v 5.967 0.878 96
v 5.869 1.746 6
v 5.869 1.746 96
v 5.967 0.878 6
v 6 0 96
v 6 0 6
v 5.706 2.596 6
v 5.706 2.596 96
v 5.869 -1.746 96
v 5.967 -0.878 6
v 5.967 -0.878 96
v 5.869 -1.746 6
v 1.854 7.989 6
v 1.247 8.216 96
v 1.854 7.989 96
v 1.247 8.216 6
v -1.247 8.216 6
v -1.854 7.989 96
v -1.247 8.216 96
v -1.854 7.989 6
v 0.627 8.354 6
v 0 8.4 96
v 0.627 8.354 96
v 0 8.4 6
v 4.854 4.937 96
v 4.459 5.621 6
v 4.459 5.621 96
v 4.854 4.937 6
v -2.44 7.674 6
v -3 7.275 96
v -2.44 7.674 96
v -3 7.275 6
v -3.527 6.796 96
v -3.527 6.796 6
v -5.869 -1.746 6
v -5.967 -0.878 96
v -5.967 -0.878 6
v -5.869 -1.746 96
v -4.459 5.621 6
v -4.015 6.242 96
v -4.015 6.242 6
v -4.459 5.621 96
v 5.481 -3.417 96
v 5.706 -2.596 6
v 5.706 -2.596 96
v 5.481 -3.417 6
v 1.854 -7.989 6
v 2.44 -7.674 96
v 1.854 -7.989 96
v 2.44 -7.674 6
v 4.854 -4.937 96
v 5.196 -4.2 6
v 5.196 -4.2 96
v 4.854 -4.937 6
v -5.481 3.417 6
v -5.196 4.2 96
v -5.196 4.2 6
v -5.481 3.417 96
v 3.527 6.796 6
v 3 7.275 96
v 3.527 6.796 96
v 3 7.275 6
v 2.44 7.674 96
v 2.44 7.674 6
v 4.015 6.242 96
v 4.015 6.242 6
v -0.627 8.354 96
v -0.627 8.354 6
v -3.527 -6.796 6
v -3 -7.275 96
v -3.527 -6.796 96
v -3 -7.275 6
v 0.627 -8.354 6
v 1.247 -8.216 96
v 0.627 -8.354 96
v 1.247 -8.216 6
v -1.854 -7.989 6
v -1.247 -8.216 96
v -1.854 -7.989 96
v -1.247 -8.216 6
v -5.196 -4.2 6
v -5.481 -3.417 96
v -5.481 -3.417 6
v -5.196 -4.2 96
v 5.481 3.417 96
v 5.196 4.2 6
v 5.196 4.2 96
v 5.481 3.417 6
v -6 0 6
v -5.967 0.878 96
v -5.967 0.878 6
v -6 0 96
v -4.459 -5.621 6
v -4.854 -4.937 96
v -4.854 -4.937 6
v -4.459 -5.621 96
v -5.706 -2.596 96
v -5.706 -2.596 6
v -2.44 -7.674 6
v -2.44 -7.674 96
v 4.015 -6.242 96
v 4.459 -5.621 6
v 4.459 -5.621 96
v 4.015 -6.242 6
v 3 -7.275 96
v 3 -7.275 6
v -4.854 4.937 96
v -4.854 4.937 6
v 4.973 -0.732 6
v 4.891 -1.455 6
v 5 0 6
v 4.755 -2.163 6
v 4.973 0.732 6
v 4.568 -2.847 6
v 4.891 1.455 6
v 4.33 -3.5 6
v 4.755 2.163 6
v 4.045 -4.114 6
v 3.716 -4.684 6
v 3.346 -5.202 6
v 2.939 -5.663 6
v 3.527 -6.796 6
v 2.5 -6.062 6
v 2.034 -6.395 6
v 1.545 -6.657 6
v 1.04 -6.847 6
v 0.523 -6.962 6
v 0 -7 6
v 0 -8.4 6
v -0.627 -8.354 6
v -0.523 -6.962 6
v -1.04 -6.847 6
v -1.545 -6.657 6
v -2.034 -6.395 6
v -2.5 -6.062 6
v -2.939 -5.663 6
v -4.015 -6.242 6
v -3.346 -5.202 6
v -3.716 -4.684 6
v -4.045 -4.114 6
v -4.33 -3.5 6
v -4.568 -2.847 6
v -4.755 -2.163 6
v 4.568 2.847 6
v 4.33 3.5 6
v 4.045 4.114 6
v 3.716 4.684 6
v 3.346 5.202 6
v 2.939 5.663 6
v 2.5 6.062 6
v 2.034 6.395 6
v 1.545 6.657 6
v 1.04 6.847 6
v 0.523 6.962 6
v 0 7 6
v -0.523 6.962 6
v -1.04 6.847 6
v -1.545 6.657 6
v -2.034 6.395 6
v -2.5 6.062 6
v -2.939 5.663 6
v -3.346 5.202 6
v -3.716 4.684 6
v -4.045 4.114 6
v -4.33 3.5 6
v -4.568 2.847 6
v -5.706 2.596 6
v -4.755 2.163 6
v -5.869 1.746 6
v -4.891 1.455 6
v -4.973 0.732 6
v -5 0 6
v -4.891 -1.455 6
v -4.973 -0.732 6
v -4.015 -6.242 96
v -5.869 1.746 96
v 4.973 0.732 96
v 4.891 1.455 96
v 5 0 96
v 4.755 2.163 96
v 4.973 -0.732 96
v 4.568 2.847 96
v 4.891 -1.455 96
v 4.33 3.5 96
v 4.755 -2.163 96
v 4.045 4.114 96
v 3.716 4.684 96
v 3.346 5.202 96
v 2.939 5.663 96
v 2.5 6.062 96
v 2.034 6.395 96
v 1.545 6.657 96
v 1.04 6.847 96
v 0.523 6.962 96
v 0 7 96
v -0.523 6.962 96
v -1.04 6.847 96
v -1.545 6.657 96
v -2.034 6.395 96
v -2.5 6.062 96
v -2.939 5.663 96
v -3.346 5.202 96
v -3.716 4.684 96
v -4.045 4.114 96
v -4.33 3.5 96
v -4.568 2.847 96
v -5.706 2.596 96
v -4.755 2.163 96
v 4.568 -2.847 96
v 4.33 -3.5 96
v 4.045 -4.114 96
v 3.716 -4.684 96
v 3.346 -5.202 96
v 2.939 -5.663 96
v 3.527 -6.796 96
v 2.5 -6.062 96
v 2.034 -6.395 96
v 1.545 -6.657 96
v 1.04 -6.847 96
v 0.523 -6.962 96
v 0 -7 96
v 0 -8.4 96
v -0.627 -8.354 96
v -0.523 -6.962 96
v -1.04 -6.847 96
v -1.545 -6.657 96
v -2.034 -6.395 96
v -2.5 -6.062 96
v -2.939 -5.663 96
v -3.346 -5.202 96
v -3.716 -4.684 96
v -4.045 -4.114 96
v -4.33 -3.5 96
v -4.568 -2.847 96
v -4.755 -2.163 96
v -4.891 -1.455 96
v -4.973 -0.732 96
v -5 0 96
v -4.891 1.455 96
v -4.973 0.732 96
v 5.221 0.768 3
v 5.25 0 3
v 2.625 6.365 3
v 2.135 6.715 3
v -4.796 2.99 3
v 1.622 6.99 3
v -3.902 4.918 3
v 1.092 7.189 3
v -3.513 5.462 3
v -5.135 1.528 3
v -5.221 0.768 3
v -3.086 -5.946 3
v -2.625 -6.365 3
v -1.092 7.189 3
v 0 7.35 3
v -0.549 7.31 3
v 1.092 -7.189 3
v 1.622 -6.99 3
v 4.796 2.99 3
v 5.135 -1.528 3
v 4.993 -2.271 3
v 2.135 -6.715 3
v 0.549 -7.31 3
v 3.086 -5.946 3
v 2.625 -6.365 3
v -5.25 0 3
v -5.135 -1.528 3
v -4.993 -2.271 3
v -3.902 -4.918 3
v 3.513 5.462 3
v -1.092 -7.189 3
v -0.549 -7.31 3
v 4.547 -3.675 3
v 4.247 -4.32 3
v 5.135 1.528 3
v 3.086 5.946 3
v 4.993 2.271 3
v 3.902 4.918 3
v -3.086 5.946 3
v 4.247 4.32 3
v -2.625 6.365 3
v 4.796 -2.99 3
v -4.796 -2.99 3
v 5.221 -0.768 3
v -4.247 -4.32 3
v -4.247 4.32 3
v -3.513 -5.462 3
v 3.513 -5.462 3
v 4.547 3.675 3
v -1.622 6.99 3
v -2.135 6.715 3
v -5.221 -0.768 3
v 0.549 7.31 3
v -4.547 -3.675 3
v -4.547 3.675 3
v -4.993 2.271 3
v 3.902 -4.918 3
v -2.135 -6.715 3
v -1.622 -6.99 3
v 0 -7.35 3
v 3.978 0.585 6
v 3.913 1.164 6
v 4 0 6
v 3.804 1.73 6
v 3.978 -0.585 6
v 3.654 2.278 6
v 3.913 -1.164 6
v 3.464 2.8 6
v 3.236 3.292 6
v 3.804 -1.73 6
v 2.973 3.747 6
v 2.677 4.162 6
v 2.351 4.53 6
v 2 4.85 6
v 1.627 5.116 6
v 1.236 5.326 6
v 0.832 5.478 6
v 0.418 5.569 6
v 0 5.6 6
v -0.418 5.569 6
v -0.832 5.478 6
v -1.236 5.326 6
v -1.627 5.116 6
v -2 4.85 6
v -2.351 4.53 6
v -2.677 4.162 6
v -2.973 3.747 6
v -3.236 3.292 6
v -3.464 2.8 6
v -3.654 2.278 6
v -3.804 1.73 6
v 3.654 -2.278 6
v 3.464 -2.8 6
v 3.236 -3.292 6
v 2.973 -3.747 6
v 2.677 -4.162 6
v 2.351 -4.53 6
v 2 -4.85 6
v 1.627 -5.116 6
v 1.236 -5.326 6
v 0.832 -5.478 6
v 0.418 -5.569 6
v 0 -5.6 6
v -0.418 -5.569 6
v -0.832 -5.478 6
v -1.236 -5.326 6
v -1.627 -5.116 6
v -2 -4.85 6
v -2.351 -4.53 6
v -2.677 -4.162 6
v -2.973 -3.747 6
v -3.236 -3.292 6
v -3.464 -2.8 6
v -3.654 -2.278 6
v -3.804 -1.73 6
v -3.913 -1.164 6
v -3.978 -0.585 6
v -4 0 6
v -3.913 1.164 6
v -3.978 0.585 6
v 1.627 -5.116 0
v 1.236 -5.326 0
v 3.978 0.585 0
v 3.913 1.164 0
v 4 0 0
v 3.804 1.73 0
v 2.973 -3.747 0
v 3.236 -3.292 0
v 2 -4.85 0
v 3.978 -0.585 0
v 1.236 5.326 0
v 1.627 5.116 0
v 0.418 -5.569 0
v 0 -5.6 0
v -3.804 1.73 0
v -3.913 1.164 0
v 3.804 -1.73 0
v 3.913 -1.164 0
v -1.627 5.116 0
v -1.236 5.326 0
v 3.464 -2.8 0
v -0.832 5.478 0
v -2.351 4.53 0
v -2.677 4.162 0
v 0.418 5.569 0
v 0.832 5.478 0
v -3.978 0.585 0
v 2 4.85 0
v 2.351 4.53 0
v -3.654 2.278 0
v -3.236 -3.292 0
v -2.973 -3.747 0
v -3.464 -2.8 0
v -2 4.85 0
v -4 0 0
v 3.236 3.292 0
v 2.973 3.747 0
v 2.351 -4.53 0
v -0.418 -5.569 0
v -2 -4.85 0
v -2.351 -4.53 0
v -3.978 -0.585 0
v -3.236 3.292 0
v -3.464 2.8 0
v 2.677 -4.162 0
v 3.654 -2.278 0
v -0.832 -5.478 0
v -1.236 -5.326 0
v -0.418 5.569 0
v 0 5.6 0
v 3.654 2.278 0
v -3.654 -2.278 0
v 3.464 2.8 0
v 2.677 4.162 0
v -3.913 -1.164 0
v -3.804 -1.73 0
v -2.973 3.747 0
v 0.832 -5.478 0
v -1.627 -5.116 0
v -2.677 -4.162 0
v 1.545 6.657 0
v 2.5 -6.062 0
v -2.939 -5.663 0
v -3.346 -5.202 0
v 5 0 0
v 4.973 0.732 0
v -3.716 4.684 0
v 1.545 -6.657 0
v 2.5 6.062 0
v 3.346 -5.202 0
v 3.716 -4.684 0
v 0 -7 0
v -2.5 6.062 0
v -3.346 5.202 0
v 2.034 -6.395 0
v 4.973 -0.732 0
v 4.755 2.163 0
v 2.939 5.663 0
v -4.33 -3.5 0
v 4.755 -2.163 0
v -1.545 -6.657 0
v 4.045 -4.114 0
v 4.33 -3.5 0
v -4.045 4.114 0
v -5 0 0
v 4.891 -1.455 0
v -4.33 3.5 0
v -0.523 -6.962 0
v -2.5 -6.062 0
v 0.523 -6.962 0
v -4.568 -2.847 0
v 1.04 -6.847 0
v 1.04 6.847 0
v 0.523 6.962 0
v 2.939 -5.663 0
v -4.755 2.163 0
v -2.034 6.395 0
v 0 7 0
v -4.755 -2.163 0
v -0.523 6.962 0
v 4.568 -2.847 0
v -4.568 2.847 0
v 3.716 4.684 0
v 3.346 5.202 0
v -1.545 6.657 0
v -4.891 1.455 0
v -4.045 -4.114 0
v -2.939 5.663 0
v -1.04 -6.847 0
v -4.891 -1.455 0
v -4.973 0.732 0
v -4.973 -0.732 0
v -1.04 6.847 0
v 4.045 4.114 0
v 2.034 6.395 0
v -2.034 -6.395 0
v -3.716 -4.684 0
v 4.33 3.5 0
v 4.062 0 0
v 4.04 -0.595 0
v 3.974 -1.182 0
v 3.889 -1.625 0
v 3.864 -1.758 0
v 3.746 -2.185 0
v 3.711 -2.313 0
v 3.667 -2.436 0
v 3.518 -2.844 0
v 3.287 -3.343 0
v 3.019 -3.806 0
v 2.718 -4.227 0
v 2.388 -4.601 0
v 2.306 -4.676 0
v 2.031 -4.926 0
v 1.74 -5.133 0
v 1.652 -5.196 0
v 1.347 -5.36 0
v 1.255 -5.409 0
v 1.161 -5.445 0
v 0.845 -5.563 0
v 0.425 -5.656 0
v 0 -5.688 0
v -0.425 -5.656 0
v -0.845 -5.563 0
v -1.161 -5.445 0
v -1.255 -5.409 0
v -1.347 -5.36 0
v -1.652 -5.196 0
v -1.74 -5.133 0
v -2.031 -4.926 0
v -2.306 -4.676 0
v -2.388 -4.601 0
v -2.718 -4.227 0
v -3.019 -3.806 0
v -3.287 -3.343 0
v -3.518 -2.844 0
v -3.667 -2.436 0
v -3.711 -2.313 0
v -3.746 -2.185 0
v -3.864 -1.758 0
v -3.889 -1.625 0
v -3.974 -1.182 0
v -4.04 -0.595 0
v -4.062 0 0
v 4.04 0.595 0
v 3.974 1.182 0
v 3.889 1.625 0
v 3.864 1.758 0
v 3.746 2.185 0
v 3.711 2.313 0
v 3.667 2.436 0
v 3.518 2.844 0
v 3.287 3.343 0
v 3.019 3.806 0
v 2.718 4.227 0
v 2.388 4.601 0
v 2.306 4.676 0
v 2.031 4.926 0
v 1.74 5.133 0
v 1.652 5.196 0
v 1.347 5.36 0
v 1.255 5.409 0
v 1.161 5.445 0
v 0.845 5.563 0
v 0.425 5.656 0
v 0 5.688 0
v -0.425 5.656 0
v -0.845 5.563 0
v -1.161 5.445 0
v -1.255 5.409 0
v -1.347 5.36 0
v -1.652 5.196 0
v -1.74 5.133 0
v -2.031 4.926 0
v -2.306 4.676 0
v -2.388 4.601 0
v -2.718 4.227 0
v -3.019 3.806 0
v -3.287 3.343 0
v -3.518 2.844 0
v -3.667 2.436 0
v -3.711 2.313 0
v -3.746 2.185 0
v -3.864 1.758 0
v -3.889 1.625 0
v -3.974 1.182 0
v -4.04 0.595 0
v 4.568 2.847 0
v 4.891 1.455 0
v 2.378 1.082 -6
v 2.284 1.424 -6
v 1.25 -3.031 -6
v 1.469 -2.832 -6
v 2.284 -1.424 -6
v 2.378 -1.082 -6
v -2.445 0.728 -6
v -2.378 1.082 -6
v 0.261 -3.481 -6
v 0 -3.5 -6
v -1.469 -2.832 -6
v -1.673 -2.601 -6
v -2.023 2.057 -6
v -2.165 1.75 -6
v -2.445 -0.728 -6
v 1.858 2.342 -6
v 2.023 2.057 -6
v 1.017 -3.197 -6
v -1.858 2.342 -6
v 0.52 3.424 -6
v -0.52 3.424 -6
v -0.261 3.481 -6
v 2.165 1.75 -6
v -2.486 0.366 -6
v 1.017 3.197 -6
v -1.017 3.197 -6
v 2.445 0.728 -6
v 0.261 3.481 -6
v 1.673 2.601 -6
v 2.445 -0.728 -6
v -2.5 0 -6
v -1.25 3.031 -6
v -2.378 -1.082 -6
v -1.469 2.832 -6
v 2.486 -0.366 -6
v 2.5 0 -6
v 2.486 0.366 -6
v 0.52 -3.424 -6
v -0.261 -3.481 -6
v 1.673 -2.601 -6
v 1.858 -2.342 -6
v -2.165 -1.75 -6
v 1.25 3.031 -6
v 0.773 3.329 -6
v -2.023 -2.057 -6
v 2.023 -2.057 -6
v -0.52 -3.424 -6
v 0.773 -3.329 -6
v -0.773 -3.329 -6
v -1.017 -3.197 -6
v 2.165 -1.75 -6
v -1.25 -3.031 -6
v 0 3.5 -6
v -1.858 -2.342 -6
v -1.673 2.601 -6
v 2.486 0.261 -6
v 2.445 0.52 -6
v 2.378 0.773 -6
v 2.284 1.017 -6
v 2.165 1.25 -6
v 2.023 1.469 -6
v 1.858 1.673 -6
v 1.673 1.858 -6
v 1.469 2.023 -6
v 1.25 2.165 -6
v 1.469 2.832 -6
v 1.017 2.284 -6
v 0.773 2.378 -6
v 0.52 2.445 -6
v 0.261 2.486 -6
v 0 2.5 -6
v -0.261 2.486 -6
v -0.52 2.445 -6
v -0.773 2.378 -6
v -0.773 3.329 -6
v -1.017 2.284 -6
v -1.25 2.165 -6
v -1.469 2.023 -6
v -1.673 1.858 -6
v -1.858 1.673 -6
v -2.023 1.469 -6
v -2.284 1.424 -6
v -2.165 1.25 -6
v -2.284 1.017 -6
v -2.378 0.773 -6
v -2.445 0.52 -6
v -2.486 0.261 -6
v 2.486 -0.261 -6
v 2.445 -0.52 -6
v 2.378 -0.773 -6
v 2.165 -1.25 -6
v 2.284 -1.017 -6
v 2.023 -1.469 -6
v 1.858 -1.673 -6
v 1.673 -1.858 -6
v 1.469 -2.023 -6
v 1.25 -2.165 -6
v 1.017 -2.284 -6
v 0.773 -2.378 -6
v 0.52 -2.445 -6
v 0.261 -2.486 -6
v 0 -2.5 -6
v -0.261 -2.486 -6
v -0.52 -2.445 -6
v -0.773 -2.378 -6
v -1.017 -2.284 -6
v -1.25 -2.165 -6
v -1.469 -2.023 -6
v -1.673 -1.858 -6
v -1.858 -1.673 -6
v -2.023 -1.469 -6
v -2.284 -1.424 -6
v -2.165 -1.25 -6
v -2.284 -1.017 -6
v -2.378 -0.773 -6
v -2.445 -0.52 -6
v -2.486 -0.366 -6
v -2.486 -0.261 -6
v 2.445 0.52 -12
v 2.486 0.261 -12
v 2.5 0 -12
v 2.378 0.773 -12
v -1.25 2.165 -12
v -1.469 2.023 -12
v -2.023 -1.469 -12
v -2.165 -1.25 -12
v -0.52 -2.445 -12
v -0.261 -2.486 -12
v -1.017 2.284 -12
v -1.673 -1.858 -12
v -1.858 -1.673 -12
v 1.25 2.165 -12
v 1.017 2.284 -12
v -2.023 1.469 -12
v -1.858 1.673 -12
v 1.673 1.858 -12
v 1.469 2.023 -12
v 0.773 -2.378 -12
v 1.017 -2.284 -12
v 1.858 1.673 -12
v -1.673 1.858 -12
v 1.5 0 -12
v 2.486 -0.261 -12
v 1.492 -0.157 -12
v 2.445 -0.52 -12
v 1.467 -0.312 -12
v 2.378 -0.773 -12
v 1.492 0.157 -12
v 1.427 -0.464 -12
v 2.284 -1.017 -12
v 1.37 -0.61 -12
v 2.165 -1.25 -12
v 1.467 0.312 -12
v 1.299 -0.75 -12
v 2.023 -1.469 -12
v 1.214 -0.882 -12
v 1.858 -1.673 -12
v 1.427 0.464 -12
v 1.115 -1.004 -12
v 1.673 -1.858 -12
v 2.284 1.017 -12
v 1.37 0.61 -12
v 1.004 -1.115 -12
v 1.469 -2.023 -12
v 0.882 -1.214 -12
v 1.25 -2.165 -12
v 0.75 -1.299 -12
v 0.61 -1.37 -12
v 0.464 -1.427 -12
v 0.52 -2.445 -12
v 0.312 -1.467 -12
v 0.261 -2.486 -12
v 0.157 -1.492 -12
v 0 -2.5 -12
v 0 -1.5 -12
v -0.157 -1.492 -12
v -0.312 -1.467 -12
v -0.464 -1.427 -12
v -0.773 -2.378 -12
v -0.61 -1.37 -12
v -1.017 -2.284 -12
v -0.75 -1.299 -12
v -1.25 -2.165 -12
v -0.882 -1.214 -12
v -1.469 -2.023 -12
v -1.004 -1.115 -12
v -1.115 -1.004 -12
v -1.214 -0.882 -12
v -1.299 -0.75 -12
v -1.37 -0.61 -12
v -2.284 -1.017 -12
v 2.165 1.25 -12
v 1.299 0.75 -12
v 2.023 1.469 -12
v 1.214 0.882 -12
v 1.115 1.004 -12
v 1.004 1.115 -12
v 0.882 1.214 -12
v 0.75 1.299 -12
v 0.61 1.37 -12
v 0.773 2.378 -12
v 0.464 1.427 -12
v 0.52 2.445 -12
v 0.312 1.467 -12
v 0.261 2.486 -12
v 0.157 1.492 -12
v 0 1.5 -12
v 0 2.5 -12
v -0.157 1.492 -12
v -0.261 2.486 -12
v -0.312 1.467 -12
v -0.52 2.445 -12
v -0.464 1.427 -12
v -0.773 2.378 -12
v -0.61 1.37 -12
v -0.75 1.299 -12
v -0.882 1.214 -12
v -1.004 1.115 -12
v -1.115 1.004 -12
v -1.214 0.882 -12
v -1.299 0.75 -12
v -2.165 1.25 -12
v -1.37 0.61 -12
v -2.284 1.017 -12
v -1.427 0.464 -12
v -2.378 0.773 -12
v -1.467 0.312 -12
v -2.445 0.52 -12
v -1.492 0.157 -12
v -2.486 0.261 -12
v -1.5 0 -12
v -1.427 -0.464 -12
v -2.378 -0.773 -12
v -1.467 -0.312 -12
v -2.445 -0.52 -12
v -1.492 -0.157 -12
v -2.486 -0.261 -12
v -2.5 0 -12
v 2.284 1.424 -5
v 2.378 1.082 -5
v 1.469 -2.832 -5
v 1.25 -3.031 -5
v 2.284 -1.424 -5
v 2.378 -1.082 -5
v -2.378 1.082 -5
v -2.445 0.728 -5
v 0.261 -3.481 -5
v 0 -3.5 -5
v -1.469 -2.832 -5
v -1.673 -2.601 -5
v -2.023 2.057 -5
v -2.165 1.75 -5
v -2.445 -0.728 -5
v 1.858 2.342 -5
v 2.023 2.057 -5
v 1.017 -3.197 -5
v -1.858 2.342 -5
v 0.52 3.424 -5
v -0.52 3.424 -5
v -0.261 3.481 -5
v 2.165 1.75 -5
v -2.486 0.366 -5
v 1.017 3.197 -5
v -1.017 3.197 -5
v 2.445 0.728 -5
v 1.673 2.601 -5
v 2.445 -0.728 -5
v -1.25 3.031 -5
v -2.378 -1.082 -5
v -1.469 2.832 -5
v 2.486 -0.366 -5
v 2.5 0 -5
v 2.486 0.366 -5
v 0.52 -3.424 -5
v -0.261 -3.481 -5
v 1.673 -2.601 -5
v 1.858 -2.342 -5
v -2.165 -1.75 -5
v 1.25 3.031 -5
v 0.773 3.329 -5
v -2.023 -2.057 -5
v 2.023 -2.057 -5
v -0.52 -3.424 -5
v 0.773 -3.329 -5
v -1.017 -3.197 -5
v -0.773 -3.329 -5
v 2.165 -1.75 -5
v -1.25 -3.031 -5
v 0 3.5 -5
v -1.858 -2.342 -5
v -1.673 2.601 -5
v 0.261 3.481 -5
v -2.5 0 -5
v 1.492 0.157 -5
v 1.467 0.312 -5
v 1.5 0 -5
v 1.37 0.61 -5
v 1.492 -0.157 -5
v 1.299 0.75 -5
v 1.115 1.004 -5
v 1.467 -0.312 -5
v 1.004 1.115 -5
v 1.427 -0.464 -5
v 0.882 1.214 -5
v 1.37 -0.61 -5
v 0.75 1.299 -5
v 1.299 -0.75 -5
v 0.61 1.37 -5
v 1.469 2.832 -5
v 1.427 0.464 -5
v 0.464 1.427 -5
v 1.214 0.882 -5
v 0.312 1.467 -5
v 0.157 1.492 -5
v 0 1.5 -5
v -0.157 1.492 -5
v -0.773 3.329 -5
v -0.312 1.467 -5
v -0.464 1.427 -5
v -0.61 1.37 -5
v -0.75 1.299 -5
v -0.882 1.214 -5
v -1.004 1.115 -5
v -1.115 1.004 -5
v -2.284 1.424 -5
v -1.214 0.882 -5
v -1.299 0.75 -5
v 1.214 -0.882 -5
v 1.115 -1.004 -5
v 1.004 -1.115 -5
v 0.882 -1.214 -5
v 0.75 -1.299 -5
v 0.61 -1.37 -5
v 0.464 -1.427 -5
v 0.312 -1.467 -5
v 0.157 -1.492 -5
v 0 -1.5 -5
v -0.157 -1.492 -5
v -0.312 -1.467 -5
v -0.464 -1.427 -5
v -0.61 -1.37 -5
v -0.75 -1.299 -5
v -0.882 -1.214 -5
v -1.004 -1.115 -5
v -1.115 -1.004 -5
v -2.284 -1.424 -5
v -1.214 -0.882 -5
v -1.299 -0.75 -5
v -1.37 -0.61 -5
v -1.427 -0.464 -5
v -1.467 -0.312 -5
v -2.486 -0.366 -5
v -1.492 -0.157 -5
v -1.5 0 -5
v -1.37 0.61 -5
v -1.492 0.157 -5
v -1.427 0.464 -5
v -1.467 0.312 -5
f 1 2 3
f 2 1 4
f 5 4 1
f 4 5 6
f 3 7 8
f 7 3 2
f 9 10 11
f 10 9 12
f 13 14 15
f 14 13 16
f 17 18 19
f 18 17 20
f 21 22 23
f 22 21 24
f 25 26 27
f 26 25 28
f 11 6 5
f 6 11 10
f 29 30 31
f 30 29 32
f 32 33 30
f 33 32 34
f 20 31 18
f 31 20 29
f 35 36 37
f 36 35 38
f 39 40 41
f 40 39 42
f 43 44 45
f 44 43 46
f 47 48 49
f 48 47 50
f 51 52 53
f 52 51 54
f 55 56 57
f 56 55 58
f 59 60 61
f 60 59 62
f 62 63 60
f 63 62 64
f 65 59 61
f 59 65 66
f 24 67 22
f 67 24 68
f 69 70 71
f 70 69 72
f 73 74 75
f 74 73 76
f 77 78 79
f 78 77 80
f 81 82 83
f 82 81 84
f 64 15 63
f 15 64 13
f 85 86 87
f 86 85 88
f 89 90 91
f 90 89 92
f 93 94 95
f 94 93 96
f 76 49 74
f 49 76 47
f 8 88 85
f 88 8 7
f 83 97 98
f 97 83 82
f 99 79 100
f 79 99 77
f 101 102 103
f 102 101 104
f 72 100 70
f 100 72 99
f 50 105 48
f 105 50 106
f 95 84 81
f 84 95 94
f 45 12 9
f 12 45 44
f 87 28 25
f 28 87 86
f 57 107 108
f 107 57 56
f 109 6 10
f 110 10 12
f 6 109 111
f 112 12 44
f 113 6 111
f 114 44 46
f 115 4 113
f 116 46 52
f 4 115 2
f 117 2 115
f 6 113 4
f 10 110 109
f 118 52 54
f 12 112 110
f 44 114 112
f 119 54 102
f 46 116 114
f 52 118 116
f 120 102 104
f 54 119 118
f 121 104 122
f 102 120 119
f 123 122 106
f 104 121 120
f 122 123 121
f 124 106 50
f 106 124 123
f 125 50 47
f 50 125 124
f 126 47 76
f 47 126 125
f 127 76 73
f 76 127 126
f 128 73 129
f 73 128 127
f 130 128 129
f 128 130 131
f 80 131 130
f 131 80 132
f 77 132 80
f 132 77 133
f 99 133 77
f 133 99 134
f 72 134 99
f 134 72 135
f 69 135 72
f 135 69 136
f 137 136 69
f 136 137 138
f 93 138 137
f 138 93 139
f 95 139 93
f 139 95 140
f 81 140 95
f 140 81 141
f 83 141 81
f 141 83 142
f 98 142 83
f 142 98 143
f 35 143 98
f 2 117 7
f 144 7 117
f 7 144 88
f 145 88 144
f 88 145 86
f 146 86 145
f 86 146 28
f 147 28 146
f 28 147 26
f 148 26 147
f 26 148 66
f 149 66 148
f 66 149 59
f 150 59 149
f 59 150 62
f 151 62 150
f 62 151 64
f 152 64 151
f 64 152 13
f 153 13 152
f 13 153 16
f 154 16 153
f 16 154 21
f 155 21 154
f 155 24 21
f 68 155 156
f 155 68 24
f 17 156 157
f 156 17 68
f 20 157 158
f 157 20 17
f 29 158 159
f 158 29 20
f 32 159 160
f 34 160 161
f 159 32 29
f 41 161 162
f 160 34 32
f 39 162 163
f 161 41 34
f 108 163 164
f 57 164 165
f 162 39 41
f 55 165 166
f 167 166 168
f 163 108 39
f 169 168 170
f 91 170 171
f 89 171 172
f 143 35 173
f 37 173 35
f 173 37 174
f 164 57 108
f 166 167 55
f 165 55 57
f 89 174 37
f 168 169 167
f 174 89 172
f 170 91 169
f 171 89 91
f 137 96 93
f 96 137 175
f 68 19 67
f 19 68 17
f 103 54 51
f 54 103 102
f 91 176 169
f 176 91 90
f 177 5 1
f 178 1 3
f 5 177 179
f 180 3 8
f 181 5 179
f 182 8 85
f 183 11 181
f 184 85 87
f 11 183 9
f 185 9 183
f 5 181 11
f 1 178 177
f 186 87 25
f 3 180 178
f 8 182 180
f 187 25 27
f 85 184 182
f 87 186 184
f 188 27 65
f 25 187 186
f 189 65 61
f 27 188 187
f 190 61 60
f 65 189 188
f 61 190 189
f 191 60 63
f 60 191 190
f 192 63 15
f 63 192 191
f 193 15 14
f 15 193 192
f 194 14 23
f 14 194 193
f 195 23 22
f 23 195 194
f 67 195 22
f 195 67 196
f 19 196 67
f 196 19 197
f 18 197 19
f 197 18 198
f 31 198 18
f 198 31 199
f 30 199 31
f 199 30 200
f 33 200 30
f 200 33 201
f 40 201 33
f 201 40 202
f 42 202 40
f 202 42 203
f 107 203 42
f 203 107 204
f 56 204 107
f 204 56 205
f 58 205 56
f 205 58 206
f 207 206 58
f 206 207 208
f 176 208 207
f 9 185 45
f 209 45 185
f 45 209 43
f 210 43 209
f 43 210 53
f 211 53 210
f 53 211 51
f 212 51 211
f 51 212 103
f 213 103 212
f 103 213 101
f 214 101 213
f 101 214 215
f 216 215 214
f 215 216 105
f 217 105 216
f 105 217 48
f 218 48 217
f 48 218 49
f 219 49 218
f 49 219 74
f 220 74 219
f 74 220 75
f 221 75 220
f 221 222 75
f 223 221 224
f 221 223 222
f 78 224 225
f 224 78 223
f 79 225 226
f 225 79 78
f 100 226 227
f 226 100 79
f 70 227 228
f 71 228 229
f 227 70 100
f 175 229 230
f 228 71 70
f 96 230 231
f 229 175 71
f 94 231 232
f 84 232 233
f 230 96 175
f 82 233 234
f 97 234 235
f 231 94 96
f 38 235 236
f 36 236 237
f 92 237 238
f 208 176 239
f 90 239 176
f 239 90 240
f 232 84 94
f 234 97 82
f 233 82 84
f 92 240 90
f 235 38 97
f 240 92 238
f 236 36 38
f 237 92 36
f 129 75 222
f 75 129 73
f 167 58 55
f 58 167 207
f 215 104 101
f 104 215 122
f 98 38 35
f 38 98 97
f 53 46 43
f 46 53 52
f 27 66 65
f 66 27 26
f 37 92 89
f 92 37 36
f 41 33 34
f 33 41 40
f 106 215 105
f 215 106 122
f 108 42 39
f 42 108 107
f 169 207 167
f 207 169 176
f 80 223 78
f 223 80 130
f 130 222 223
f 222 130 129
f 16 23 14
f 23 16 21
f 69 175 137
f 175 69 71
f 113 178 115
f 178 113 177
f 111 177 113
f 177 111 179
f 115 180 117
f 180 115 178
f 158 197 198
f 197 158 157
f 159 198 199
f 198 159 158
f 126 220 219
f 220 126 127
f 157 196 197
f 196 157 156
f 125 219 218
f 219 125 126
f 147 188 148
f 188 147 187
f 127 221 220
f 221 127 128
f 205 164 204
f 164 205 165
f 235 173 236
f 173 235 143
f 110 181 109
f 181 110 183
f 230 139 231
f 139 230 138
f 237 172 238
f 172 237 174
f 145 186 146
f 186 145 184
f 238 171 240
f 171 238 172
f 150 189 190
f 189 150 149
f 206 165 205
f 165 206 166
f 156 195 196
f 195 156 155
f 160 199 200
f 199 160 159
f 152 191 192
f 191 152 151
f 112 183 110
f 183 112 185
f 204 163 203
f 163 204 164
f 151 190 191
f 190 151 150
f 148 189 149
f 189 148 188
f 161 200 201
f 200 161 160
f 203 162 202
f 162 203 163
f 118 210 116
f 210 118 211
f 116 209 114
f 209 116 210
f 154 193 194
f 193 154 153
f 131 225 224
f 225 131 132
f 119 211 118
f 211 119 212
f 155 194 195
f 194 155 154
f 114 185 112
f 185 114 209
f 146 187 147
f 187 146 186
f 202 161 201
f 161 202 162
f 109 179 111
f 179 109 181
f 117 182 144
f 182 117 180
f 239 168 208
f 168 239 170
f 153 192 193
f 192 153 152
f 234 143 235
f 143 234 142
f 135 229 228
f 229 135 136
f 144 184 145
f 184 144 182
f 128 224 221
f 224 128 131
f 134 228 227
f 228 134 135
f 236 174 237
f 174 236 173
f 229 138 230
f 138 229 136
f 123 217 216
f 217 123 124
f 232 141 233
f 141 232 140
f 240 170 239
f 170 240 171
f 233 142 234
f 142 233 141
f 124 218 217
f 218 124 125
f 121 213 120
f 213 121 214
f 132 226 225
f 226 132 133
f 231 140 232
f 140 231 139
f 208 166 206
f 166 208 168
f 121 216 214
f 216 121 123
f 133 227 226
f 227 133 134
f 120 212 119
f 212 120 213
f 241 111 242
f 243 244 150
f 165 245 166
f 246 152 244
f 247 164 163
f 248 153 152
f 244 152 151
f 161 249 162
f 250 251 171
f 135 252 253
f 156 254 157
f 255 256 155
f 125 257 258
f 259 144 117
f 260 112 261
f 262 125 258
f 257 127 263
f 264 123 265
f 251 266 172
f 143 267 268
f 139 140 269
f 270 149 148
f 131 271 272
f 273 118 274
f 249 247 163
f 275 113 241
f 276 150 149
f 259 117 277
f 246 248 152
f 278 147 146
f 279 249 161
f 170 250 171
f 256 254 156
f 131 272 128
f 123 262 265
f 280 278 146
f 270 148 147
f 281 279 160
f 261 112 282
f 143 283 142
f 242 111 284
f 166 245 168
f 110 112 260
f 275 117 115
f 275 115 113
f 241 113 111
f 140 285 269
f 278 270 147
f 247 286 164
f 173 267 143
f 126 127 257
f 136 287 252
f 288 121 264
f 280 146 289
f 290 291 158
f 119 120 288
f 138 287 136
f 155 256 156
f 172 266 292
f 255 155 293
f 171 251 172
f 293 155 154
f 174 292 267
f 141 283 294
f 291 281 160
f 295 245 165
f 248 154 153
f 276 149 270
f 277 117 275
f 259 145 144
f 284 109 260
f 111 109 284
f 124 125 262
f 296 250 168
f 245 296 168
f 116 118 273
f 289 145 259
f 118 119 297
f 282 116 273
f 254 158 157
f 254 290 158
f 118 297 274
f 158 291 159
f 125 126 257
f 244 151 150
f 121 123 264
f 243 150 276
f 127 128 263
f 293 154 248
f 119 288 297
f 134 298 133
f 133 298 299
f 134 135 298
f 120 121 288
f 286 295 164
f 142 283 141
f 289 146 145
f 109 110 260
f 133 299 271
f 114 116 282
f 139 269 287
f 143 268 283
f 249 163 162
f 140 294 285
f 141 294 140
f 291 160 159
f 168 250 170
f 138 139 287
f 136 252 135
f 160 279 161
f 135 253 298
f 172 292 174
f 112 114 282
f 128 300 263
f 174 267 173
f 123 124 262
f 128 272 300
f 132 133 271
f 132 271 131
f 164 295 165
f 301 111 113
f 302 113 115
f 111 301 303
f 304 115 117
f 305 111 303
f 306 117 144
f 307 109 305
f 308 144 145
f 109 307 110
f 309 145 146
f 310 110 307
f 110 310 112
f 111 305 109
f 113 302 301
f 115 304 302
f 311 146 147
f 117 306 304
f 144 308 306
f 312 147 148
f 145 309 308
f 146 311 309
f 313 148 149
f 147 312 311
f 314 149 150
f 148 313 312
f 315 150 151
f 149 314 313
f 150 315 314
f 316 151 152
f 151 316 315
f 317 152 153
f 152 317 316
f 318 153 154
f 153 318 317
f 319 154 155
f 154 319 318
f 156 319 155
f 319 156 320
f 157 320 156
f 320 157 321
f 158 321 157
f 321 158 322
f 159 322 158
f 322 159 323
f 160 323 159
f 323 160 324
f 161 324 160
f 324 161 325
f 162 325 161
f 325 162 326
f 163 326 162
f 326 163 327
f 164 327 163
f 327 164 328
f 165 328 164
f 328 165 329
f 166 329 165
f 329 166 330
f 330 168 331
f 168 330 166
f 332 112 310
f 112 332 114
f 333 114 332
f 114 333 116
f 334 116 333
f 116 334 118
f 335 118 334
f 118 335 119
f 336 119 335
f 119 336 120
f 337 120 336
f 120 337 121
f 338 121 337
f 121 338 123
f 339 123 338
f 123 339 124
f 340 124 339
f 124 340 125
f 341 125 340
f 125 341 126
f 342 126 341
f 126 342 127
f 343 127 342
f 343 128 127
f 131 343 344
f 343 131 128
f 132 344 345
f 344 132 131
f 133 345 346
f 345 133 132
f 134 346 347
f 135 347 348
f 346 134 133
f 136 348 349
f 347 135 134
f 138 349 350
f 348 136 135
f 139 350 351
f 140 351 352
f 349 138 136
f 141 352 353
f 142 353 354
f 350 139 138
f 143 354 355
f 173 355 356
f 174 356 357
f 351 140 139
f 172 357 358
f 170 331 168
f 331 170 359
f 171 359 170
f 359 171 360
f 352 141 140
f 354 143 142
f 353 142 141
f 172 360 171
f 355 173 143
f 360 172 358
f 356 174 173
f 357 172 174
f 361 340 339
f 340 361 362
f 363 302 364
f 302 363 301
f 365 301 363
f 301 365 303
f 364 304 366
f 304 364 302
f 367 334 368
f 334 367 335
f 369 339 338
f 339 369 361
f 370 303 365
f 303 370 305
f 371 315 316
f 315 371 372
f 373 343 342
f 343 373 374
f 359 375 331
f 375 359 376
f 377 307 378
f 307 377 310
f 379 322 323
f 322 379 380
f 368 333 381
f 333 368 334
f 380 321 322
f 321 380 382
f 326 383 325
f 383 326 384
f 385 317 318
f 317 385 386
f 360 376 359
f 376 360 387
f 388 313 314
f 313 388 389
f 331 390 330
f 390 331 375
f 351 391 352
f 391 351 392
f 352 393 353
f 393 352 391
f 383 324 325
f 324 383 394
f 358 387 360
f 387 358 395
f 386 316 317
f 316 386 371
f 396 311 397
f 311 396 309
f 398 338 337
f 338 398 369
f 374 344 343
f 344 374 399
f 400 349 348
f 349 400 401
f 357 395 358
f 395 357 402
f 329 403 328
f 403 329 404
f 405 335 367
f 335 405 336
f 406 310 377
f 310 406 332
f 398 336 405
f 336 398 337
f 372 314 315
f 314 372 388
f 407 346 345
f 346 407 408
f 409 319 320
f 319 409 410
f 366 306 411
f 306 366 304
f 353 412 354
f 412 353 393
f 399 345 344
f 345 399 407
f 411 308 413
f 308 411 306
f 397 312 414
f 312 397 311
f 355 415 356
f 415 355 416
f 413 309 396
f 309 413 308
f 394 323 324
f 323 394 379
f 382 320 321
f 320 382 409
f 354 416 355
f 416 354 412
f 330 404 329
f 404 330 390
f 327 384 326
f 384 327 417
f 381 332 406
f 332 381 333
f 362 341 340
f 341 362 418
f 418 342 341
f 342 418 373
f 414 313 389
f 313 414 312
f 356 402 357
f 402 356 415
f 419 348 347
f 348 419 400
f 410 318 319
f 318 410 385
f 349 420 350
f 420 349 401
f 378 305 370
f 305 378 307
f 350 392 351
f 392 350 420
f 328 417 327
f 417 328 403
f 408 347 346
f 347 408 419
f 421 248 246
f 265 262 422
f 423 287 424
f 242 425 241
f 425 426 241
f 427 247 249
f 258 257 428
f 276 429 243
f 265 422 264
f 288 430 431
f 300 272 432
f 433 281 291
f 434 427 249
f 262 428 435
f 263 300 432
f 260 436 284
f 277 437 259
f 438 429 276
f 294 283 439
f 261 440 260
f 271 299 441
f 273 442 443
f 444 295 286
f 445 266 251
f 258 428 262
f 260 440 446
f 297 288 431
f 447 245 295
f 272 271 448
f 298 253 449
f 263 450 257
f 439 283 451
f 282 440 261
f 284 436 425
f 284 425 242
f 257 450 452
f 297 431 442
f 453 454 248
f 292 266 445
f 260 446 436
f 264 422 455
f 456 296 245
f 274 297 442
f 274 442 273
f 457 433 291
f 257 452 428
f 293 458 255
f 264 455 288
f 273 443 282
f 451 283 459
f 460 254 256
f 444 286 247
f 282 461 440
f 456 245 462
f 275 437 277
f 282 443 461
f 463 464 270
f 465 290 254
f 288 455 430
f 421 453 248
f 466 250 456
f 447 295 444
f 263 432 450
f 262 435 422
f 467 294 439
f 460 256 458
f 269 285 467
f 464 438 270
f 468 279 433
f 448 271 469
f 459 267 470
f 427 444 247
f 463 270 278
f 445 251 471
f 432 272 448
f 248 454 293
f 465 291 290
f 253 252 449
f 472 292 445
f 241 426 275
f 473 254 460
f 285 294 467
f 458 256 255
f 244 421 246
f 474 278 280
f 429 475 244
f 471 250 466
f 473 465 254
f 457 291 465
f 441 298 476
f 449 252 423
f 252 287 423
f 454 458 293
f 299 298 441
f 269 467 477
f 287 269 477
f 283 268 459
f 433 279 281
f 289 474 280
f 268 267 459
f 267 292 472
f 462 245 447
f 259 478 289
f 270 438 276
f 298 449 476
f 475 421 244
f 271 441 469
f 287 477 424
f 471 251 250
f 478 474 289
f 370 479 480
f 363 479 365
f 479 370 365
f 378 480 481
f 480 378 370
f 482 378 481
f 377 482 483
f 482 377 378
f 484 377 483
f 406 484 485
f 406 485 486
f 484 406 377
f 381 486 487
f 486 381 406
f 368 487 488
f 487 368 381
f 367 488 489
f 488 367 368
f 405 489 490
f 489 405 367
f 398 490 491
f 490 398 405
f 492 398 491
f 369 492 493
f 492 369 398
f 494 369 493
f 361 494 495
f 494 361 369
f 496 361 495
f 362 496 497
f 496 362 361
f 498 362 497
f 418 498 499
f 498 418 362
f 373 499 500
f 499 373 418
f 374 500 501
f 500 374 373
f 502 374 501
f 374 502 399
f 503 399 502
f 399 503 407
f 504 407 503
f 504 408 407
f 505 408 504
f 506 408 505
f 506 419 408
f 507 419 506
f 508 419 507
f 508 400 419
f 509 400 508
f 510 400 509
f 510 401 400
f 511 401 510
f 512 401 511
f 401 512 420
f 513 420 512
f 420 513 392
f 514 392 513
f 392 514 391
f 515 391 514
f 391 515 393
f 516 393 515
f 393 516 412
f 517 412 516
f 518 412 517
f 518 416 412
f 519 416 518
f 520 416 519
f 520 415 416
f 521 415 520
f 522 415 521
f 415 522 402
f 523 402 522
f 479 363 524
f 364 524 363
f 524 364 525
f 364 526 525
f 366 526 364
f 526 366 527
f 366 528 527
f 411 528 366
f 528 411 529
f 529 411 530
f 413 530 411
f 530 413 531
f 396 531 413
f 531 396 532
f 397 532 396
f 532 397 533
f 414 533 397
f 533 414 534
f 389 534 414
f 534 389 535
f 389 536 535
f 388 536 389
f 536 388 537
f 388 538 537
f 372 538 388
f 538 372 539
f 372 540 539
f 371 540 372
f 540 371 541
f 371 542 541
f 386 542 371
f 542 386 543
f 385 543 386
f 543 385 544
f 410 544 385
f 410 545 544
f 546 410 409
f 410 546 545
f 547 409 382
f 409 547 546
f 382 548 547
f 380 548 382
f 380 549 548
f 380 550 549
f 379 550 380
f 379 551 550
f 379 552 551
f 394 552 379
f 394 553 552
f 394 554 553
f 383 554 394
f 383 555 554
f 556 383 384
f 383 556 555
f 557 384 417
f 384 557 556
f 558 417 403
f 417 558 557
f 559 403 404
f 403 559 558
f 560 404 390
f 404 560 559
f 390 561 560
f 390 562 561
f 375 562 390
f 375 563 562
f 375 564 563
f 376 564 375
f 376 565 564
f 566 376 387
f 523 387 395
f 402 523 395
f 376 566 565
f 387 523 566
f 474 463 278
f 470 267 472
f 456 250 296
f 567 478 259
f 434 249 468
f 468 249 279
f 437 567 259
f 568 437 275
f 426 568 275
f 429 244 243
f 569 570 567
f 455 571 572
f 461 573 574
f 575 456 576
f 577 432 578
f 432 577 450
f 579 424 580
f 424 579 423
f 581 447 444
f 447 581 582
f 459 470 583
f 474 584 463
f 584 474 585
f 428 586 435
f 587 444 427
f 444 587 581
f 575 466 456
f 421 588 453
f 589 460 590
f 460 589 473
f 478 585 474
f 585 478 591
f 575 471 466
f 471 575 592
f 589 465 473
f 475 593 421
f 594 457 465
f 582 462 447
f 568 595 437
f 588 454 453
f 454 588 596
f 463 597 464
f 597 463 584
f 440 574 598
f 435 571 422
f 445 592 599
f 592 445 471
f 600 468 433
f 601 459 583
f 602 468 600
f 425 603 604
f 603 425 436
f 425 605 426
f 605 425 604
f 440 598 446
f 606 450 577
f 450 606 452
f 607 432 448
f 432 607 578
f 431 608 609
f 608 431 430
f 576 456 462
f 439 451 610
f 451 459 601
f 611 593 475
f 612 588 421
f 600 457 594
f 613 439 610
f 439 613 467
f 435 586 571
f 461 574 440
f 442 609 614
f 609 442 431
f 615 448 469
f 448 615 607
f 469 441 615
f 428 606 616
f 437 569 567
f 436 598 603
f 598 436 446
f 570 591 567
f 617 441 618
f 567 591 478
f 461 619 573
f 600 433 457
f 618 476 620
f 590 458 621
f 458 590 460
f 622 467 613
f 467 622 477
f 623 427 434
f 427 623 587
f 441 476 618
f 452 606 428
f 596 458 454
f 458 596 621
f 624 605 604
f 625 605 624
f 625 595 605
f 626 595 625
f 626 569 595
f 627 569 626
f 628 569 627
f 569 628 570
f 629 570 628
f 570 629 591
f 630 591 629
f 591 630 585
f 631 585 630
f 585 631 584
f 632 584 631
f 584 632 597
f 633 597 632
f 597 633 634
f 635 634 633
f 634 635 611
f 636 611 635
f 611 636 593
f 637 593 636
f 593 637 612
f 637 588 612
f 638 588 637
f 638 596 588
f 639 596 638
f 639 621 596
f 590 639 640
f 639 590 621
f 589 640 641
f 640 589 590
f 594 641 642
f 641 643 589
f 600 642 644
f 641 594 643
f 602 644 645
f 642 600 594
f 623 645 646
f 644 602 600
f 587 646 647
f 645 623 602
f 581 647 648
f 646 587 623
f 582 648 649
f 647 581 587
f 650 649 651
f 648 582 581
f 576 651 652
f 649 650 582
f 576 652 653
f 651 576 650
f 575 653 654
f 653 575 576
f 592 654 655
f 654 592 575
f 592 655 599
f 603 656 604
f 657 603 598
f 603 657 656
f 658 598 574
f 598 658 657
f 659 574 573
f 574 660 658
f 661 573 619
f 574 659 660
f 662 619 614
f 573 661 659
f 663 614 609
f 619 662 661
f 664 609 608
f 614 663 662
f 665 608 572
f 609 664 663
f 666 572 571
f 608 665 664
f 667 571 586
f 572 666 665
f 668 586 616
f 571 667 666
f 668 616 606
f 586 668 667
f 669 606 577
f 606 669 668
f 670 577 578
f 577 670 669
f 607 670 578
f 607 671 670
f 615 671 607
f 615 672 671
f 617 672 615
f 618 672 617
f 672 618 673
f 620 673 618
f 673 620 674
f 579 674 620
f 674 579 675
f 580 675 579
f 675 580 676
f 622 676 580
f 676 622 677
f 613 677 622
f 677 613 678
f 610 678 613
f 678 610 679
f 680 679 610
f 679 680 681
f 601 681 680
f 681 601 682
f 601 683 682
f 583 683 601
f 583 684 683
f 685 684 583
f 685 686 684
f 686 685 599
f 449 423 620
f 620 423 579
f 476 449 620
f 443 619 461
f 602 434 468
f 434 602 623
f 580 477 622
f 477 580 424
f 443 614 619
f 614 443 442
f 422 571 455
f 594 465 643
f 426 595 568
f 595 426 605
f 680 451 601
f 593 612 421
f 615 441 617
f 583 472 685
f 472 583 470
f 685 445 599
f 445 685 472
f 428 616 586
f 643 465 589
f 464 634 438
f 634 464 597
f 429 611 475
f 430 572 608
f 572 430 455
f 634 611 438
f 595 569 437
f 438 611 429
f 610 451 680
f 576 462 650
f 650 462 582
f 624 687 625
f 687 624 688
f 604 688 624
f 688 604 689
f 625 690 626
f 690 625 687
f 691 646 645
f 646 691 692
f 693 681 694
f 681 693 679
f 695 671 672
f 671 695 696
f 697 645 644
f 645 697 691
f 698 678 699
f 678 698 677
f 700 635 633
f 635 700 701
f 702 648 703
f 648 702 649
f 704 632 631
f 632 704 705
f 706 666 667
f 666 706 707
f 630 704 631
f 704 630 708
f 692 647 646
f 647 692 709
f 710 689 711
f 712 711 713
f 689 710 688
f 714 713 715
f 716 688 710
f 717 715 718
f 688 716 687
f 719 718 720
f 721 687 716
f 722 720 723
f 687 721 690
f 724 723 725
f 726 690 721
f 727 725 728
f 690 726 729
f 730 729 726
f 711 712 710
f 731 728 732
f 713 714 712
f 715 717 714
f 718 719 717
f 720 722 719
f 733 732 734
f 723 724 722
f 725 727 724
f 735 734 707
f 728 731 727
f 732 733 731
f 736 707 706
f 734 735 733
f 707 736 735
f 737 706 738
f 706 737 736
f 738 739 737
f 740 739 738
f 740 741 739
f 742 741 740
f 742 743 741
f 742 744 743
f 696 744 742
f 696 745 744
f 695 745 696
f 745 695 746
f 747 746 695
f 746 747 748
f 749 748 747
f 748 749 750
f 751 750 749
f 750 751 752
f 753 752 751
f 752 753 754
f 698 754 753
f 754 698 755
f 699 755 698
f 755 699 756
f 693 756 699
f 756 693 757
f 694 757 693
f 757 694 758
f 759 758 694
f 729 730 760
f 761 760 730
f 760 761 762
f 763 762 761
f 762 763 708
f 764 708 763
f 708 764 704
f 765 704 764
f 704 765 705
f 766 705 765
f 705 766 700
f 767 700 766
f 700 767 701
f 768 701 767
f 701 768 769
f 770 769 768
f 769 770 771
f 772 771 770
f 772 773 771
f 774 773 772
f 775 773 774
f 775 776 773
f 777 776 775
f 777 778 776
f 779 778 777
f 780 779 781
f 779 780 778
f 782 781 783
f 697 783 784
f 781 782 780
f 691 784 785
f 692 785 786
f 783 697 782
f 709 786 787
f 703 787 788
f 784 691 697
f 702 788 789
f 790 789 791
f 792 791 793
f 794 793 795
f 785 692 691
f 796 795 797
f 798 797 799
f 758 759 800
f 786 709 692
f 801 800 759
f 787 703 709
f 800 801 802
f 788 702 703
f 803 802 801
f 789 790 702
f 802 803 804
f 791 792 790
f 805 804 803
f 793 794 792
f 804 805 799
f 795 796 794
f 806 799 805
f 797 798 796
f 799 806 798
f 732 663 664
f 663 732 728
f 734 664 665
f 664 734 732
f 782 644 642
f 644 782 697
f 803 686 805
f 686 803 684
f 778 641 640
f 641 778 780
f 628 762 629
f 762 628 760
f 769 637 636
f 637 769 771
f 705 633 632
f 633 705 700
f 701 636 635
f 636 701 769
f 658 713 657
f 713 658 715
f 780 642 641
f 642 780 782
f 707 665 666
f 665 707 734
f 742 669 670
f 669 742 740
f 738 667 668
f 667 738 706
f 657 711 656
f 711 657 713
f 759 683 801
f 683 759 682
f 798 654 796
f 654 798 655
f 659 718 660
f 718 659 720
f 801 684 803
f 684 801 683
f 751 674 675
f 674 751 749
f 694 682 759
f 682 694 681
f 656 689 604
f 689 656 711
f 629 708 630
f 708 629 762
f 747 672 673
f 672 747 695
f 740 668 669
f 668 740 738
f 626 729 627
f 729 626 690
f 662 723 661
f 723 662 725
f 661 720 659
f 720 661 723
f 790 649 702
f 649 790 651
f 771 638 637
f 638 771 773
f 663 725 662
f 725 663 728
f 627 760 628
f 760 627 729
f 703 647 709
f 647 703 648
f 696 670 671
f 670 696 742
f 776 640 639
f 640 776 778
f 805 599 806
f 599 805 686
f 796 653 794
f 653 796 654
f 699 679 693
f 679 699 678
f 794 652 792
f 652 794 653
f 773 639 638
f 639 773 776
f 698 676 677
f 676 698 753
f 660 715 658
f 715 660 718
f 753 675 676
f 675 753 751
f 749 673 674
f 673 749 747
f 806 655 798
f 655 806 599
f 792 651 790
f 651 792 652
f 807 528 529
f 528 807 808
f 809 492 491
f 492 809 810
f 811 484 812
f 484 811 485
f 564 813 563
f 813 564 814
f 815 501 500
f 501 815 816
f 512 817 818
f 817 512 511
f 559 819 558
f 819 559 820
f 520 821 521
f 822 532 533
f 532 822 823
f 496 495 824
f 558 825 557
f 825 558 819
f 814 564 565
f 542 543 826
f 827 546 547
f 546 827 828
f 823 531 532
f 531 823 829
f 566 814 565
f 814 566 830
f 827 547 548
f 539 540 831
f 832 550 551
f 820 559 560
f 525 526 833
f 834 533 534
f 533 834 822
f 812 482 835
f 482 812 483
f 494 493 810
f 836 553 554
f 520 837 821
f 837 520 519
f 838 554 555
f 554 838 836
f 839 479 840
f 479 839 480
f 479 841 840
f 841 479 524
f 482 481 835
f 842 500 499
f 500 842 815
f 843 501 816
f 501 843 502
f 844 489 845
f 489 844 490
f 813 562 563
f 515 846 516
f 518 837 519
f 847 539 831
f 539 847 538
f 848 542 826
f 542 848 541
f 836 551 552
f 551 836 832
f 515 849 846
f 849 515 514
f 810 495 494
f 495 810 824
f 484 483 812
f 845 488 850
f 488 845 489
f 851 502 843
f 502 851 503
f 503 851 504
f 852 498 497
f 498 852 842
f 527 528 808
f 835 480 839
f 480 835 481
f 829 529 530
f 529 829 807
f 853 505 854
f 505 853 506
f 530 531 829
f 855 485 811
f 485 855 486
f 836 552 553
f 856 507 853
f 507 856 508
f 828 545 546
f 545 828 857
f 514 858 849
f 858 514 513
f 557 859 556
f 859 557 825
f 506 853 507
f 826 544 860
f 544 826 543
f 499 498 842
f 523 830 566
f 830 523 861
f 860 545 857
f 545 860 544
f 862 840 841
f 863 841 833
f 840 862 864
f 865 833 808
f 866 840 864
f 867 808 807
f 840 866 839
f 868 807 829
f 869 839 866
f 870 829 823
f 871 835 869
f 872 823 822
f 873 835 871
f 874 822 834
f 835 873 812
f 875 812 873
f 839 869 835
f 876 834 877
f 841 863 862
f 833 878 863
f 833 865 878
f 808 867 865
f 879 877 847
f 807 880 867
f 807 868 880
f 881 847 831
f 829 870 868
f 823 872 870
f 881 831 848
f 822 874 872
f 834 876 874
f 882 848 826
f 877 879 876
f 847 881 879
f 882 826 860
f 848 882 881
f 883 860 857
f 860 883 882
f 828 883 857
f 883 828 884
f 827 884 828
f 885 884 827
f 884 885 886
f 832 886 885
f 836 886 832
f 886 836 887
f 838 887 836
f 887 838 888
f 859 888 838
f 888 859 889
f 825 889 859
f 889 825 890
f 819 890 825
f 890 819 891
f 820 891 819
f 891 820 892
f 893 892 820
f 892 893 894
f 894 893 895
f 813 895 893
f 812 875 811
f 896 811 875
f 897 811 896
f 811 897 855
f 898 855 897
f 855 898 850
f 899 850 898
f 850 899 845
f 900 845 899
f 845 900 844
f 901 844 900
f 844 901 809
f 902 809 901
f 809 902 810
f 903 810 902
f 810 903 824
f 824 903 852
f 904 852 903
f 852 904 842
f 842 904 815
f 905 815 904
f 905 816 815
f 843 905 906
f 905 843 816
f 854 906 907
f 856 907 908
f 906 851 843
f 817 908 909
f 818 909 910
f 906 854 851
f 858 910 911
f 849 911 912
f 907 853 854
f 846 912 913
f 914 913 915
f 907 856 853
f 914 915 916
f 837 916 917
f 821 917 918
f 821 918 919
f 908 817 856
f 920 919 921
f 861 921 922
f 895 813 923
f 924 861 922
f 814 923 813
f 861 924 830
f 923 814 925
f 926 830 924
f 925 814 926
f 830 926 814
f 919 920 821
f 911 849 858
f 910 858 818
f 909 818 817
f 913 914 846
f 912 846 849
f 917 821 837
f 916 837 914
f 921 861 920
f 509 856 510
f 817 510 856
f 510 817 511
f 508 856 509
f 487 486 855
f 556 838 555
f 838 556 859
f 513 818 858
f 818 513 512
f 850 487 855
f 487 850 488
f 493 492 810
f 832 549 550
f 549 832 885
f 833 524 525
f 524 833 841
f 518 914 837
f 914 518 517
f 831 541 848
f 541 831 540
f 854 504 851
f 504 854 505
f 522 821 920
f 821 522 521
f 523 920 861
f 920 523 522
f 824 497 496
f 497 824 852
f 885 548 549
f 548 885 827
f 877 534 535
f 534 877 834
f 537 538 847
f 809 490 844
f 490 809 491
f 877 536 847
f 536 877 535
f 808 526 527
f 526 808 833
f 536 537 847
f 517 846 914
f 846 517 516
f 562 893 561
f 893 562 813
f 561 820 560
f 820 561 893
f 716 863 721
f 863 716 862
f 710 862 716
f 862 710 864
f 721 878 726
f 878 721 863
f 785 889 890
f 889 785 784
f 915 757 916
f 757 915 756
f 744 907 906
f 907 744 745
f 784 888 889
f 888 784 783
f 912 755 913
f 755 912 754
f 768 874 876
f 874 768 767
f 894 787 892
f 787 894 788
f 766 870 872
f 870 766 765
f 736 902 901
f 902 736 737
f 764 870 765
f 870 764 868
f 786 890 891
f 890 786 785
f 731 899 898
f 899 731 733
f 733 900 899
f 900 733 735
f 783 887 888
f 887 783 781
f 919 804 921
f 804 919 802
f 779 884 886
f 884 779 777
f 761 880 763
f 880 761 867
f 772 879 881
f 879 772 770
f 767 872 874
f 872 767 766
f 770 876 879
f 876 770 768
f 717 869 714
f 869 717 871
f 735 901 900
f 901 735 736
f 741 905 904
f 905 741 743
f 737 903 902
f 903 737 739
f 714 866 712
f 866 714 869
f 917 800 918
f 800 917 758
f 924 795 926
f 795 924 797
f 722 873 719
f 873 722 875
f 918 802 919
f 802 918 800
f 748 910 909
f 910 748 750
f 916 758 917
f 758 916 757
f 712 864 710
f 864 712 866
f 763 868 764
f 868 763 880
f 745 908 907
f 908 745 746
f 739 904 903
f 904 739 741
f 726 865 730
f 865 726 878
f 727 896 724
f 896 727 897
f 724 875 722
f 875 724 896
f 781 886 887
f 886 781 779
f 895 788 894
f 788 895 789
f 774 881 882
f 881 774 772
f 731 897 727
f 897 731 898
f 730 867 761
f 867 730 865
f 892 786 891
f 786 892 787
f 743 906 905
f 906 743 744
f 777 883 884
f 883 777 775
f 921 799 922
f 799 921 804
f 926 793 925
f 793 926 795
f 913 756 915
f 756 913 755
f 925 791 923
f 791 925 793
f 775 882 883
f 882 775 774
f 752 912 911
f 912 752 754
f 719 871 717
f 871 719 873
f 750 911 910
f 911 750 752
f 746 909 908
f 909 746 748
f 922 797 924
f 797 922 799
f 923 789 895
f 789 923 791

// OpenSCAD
// add ridge for stopper
module body() {
  difference() {
    scale([1, 1.4, 1]) cylinder($length, $case_rad, $case_rad, true);
    scale([1, 1.4, 1]) cylinder($length + 2, $case_rad - 1, $case_rad - 1, true);
  }
  translate([0, 0, -$length / 2 -3]) ridge();
}

module nib_port() {
  translate([0, 0, -3]) difference() {
    union() {
      scale([1, 1.4, 1]) cylinder(6, $nib_rad + 1, $case_rad - 1, true);
      translate([0, 0, -6]) cylinder(6, $nib_rad + 1, $nib_rad + 1, true);
    }
    union() {
      translate([0, 0, 2]) scale([1, 1.4, 1]) cylinder(8, $nib_rad + 1, $case_rad - 1, true);
      translate([0, 0, -6]) cylinder(10, $nib_rad, $nib_rad, true);
    }
  }
}

module ridge() {
  translate([0, 0, 1.5]) difference() {
    scale([1, 1.4, 1]) cylinder(3, $case_rad - .75, $case_rad - 1, true);
    scale([1, 1.4, 1]) cylinder(4, $case_rad - 2, $case_rad - 2, true);
  }
  translate([0, 0, -1.5]) difference() {
    scale([1, 1.4, 1]) cylinder(3, $case_rad - 1, $case_rad - .75, true);
    scale([1, 1.4, 1]) cylinder(4, $case_rad - 2, $case_rad - 2, true);
  }
}

module cap() {
  difference() {
    scale([1, 1.4, 1]) cylinder([5, $case_rad, $case_rad]);
  }
}


$fn = 60;
$length = 90;
$case_rad = 6;
$nib_rad = 1.5;
translate([0, 0, $length / 2 + 6]) body();
nib_port();
